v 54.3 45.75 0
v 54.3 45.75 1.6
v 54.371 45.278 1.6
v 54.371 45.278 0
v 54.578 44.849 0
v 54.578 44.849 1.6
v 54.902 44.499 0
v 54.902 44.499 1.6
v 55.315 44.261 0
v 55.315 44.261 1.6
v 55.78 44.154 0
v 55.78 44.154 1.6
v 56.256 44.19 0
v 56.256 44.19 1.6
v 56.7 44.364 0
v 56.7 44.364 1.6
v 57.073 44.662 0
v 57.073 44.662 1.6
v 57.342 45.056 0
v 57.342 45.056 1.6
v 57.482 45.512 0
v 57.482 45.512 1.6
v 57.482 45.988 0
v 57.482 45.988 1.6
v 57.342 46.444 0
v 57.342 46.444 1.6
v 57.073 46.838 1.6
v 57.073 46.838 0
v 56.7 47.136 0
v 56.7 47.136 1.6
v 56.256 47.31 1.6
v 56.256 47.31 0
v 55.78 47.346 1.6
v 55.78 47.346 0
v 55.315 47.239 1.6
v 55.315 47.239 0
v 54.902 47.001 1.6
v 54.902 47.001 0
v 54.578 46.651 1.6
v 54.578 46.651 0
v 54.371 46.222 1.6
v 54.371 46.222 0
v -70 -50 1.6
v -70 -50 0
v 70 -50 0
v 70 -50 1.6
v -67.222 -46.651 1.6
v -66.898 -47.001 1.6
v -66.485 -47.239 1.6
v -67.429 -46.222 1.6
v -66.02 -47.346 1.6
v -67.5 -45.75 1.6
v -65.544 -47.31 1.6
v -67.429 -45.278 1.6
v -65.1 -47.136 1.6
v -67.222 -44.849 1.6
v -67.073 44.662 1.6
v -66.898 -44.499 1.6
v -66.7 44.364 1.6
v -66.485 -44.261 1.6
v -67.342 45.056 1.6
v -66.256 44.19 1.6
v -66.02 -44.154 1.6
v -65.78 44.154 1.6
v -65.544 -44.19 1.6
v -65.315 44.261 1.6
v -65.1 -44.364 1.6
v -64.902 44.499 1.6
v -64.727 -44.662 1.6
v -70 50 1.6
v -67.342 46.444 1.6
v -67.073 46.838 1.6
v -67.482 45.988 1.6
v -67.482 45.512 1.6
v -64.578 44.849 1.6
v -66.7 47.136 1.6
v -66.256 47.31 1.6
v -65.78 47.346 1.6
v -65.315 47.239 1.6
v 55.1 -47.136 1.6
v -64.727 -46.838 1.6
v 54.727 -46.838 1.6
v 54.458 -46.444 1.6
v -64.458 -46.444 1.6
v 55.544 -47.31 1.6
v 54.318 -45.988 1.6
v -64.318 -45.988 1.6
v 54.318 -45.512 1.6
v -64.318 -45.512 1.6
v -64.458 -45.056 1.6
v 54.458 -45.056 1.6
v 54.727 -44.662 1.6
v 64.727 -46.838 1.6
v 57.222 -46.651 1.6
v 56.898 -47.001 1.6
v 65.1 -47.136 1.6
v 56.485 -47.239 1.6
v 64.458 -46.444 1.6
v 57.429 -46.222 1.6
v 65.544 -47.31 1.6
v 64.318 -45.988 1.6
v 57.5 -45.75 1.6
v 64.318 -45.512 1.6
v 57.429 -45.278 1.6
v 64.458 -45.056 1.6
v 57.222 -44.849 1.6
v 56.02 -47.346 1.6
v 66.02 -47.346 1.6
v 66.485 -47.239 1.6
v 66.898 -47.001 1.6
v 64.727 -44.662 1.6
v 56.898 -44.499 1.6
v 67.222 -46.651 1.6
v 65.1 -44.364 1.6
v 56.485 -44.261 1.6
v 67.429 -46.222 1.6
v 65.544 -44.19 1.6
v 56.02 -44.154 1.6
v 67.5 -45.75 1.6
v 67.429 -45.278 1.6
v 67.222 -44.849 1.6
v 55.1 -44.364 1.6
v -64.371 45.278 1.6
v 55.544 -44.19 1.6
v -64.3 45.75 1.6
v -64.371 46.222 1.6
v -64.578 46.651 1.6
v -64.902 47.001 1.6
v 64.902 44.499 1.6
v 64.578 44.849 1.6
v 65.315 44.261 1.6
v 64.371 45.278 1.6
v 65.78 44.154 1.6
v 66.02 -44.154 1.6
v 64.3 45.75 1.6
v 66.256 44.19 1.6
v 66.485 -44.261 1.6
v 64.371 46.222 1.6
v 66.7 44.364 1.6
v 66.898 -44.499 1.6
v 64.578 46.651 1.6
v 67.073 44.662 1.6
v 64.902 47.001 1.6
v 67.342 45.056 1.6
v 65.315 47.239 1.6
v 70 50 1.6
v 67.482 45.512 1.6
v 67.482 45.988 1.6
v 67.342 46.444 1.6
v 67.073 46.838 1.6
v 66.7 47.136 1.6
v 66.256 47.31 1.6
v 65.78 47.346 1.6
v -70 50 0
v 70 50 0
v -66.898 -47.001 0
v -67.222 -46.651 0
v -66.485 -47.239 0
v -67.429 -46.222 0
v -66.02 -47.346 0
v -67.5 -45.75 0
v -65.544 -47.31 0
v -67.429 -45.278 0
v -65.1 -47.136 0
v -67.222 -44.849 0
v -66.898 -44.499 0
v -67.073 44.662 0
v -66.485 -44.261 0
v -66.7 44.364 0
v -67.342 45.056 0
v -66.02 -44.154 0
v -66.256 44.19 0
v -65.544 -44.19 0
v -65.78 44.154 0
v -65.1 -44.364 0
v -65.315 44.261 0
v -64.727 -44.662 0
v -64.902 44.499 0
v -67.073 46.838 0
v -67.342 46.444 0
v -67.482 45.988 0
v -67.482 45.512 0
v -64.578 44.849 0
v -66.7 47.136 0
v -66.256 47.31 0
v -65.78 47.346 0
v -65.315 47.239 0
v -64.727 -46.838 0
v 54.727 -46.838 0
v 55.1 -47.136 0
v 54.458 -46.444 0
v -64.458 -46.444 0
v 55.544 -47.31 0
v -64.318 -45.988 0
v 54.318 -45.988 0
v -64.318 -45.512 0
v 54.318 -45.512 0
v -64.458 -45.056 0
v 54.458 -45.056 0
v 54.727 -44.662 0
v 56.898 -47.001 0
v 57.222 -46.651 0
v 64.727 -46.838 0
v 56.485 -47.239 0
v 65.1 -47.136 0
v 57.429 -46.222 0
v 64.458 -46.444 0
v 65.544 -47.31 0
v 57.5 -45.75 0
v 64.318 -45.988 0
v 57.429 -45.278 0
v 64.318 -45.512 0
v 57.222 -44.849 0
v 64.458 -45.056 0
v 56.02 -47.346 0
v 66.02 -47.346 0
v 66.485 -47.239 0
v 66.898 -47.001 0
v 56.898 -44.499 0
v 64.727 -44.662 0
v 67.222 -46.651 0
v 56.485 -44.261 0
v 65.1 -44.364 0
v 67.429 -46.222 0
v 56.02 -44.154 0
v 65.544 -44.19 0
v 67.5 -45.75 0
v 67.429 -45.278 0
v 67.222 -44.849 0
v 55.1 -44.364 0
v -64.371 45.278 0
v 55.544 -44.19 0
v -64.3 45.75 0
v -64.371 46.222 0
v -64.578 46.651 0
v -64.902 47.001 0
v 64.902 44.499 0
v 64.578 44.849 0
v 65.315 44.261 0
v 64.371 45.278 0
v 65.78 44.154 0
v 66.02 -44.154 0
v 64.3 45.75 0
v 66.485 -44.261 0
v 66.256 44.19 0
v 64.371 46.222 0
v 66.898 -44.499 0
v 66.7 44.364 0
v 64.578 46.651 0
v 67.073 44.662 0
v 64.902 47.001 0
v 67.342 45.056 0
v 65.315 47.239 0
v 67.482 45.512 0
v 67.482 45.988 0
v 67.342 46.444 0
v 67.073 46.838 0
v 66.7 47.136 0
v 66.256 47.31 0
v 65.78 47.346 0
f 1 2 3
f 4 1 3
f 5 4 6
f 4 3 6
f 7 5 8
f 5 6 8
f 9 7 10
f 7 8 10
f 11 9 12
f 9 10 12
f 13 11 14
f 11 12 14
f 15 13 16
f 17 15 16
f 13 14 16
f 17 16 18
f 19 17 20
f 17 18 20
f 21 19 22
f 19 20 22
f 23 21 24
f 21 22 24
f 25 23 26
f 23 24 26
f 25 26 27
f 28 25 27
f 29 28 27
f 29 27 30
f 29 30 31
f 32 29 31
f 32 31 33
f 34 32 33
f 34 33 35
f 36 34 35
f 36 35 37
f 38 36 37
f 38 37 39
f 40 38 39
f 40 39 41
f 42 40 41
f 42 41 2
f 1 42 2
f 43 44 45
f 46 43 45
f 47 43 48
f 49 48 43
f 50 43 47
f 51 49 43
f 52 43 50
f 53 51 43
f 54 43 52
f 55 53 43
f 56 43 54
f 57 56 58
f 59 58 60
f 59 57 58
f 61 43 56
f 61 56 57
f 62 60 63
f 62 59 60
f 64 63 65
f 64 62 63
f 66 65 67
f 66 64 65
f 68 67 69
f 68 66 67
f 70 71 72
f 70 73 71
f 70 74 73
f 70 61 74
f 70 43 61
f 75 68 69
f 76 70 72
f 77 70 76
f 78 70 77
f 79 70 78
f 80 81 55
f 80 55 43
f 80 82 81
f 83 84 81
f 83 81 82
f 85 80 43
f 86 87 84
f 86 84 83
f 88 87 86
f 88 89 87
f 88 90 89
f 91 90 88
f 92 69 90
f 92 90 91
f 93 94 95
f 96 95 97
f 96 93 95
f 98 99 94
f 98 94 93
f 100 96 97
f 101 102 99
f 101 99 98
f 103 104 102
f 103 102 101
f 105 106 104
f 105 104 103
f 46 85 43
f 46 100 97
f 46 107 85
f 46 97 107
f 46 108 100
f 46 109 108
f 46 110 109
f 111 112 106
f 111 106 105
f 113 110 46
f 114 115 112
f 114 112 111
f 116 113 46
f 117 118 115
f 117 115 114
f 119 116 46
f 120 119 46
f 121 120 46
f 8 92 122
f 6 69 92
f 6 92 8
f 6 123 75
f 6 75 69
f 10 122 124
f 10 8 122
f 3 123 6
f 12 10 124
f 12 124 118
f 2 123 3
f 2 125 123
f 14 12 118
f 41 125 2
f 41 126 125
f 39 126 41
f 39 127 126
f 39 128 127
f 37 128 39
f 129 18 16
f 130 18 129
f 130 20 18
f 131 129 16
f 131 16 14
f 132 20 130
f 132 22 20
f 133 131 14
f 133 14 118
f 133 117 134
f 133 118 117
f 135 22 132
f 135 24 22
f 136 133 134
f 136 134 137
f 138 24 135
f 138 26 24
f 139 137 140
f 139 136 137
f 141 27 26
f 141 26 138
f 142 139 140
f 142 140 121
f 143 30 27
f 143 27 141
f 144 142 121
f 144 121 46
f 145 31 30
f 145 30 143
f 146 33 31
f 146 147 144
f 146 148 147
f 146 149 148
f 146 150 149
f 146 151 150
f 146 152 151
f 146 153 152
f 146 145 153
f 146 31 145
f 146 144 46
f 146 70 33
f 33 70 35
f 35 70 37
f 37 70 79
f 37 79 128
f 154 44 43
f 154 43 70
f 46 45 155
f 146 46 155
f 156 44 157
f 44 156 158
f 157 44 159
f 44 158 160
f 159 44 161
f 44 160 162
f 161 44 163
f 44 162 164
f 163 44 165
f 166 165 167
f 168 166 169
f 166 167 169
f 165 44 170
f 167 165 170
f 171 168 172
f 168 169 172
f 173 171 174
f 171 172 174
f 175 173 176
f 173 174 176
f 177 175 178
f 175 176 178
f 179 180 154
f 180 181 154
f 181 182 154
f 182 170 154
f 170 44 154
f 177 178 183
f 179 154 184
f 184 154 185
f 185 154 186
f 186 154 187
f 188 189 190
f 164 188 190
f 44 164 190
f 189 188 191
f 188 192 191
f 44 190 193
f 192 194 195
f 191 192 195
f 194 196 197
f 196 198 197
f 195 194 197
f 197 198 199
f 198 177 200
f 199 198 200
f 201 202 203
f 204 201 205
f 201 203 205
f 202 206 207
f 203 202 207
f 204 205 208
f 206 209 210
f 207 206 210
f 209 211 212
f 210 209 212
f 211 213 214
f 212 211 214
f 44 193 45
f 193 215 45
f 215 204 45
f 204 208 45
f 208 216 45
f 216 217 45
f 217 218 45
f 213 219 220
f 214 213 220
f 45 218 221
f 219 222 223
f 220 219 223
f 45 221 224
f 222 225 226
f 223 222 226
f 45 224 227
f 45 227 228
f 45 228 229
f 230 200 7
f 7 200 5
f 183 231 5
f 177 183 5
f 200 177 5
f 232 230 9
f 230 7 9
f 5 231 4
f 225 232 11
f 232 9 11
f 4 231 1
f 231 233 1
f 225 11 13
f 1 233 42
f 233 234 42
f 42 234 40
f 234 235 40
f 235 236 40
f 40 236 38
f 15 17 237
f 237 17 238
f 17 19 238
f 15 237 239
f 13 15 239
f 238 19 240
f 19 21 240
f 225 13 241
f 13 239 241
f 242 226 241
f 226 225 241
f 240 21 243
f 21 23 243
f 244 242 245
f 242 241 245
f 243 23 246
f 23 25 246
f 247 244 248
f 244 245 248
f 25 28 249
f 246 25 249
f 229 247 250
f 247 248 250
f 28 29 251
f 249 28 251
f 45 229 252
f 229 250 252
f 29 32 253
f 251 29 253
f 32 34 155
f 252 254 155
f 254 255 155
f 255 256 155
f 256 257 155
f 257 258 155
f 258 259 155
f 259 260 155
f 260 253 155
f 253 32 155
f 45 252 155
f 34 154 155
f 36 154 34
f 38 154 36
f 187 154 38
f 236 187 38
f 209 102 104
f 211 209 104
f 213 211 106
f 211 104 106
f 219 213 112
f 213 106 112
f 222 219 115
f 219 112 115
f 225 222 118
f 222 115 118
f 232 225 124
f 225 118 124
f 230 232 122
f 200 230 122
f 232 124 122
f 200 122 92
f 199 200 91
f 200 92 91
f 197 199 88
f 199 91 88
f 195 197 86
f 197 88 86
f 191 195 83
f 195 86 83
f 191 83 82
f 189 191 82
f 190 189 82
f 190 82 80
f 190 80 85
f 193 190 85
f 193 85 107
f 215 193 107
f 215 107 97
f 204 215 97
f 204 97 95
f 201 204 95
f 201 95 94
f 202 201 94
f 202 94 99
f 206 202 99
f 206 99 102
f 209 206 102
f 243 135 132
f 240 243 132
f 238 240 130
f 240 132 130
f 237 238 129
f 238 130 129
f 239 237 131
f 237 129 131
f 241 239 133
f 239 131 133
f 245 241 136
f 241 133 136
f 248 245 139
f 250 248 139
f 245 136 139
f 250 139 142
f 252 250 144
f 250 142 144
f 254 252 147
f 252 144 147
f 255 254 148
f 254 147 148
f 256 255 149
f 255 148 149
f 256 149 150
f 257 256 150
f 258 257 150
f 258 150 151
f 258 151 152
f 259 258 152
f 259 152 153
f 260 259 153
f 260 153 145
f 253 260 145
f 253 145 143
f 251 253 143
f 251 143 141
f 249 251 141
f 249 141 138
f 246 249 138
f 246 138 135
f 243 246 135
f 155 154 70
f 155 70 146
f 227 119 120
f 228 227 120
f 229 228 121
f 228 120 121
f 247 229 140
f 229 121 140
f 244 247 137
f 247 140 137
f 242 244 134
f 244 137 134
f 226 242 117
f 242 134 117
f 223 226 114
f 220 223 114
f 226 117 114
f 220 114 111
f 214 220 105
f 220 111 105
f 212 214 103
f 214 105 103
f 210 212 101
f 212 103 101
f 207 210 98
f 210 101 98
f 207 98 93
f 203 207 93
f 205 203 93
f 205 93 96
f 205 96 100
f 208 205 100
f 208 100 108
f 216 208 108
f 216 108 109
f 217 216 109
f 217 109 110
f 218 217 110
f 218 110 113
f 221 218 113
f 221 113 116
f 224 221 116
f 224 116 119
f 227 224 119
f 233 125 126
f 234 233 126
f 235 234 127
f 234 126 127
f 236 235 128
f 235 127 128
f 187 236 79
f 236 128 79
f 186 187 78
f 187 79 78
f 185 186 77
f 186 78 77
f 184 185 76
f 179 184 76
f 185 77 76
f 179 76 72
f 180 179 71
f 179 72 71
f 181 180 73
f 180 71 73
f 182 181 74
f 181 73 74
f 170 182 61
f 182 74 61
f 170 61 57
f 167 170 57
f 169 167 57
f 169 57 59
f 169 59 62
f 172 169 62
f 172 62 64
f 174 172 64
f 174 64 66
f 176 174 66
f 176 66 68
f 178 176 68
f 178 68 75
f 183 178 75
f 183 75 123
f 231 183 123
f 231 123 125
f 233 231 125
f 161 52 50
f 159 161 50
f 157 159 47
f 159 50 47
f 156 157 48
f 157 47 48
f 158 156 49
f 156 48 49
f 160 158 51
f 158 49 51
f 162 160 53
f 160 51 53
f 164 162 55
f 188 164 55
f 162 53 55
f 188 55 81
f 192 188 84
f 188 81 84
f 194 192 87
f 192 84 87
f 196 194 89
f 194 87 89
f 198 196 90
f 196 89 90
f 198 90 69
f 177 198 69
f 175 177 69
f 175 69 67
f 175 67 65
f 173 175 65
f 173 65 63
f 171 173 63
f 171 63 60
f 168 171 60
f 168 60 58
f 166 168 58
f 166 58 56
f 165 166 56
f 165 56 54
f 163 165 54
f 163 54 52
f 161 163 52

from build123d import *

# Parameters (mm, degrees)
SKETCH_1_W          = 140
SKETCH_1_H          = 100
EXTRUDE_1_DEPTH     = 1.6
SKETCH_2_R          = 1.6
CUT_EXTRUDE_1_DEPTH = 87.038131082


with BuildPart() as part:
    # Эскиз1 → Бобышка-Вытянуть1 (new body)
    with BuildSketch(Plane.XY):
        Rectangle(SKETCH_1_W, SKETCH_1_H)
    extrude(amount=EXTRUDE_1_DEPTH)

    # Эскиз2 → Вырез-Вытянуть1 (cut, through all)
    with BuildSketch(Plane.XY.offset(1.6)):
        with Locations((-65.9, 45.75)):
            Circle(SKETCH_2_R)
        with Locations(Location((65.9, 45.75, 0), (0, 0, 180))):
            Circle(SKETCH_2_R)
        with Locations((65.9, -45.75)):
            Circle(SKETCH_2_R)
        with Locations(Location((-65.9, -45.75, 0), (0, 0, 180))):
            Circle(SKETCH_2_R)
        with Locations(Location((55.9, 45.75, 0), (0, 0, 180))):
            Circle(SKETCH_2_R)
        with Locations((55.9, -45.75)):
            Circle(SKETCH_2_R)
    extrude(amount=-CUT_EXTRUDE_1_DEPTH, mode=Mode.SUBTRACT)


solid = part.part
